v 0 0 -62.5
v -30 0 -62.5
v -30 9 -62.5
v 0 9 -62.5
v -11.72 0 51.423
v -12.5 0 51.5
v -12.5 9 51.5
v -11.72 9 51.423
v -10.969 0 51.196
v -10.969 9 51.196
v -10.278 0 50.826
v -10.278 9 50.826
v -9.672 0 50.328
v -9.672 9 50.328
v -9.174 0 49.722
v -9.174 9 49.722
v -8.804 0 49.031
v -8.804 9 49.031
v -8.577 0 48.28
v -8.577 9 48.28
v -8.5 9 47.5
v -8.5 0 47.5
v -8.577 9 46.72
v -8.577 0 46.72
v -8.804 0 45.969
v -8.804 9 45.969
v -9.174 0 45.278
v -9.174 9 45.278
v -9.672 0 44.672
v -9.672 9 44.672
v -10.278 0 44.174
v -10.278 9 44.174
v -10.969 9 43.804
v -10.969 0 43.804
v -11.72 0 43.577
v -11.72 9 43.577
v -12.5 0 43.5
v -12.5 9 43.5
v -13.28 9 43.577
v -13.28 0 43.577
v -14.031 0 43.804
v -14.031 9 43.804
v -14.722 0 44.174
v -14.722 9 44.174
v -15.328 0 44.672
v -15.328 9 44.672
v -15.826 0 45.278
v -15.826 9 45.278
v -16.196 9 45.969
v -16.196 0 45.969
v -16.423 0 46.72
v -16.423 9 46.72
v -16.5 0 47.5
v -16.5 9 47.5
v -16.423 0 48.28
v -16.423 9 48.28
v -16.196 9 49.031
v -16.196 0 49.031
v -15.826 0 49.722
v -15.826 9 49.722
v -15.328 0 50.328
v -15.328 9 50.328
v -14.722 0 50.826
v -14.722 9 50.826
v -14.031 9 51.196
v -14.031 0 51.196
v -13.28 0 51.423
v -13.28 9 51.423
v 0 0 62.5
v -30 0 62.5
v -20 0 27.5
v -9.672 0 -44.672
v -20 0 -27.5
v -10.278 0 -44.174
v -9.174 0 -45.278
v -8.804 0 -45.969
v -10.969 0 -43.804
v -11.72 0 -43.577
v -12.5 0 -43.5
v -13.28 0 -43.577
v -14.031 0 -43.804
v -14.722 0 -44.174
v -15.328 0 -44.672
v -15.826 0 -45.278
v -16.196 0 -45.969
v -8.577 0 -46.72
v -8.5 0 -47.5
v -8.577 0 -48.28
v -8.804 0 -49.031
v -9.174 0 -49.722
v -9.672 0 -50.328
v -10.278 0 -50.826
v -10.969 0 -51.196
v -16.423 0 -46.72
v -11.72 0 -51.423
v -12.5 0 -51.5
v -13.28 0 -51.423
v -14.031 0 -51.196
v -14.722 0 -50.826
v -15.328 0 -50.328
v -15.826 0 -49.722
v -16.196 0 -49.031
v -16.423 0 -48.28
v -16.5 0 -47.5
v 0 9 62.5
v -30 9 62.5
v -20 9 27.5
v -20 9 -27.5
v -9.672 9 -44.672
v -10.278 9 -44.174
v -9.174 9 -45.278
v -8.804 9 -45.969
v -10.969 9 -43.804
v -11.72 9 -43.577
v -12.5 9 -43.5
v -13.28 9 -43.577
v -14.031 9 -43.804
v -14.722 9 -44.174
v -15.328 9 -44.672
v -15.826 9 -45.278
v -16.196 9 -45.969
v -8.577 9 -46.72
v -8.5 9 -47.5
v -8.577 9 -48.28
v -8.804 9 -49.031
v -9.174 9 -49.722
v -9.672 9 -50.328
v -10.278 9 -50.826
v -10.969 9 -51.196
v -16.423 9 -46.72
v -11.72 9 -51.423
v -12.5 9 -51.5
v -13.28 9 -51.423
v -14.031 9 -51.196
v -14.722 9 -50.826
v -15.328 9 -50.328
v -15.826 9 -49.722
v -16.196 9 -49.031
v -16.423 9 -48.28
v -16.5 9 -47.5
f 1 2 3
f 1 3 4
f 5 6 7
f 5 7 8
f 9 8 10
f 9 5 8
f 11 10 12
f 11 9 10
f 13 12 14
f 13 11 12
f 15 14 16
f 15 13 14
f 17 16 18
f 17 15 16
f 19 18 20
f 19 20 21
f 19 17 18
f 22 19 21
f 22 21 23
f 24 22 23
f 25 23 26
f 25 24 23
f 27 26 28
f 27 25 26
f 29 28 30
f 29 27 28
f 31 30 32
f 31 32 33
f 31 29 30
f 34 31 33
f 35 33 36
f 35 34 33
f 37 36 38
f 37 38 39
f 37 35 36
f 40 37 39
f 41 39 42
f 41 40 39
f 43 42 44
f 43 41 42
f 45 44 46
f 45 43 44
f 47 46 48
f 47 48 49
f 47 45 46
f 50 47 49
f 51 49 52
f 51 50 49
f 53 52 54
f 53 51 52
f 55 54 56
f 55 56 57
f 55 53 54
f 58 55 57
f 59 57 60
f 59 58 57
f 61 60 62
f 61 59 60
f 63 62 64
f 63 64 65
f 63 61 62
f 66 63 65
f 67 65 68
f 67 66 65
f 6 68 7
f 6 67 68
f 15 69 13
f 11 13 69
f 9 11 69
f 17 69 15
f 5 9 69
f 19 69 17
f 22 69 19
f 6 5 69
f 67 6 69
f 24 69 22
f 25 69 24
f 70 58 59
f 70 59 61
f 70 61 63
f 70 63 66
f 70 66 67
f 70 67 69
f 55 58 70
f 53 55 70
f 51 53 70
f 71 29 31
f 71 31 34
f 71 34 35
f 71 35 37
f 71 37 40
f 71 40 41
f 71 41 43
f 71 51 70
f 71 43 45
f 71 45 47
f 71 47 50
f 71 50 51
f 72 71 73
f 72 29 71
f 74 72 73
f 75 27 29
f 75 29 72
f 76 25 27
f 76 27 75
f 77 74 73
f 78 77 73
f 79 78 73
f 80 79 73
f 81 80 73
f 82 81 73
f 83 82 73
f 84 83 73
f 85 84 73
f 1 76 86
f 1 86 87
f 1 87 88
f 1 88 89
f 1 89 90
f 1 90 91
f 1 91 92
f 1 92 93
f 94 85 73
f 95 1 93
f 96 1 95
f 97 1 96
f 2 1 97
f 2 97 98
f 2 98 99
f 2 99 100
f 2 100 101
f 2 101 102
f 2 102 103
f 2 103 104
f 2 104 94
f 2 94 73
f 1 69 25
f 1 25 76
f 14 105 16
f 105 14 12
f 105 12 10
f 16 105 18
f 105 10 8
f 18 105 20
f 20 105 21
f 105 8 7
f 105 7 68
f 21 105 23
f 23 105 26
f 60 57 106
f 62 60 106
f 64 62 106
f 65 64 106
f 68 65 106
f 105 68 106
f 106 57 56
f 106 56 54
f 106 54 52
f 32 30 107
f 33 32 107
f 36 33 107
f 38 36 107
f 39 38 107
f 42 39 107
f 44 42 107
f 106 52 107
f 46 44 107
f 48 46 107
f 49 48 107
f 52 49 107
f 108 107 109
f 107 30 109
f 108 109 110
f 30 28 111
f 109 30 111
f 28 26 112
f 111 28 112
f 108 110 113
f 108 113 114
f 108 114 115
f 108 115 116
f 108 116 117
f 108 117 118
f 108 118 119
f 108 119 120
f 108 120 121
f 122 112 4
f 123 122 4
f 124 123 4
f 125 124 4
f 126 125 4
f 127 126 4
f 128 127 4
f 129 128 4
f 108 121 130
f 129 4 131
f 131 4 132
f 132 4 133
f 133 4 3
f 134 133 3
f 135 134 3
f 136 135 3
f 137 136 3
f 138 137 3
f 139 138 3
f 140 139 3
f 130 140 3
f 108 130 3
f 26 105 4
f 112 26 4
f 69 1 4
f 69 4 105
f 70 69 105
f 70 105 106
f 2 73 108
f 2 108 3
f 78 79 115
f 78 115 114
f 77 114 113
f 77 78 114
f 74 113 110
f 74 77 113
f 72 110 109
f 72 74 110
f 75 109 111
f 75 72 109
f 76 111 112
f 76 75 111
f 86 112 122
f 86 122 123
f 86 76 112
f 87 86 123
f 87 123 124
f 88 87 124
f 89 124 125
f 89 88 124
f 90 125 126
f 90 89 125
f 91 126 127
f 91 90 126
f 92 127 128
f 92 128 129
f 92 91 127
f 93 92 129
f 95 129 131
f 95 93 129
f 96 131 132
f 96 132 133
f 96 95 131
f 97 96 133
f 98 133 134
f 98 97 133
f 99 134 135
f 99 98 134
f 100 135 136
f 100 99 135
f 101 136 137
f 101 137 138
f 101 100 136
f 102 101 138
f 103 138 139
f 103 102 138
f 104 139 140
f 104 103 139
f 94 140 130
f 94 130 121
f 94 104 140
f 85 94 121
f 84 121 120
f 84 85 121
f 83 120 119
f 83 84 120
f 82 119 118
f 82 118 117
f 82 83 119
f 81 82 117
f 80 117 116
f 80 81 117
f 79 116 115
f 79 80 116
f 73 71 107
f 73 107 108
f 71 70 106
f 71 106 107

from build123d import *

# Parameters (mm, degrees)
SKETCH1_R           = 4
BOSS_EXTRUDE1_DEPTH = 9


with BuildPart() as part:
    # Sketch1 → Boss-Extrude1 (new body)
    with BuildSketch(Plane(origin=(0, 0, 0), x_dir=(1, 0, 0), z_dir=(0, 1, 0))):
        Polygon((0, 62.5), (0, -62.5), (-30, -62.5), (-20, -27.5), (-20, 27.5), (-30, 62.5), align=None)
        with Locations(Location((-12.5, 47.5, 0), (0, 0, 270))):
            Circle(SKETCH1_R, mode=Mode.SUBTRACT)
        with Locations(Location((-12.5, -47.5, 0), (0, 0, 270))):
            Circle(SKETCH1_R, mode=Mode.SUBTRACT)
    extrude(amount=BOSS_EXTRUDE1_DEPTH)


solid = part.part
